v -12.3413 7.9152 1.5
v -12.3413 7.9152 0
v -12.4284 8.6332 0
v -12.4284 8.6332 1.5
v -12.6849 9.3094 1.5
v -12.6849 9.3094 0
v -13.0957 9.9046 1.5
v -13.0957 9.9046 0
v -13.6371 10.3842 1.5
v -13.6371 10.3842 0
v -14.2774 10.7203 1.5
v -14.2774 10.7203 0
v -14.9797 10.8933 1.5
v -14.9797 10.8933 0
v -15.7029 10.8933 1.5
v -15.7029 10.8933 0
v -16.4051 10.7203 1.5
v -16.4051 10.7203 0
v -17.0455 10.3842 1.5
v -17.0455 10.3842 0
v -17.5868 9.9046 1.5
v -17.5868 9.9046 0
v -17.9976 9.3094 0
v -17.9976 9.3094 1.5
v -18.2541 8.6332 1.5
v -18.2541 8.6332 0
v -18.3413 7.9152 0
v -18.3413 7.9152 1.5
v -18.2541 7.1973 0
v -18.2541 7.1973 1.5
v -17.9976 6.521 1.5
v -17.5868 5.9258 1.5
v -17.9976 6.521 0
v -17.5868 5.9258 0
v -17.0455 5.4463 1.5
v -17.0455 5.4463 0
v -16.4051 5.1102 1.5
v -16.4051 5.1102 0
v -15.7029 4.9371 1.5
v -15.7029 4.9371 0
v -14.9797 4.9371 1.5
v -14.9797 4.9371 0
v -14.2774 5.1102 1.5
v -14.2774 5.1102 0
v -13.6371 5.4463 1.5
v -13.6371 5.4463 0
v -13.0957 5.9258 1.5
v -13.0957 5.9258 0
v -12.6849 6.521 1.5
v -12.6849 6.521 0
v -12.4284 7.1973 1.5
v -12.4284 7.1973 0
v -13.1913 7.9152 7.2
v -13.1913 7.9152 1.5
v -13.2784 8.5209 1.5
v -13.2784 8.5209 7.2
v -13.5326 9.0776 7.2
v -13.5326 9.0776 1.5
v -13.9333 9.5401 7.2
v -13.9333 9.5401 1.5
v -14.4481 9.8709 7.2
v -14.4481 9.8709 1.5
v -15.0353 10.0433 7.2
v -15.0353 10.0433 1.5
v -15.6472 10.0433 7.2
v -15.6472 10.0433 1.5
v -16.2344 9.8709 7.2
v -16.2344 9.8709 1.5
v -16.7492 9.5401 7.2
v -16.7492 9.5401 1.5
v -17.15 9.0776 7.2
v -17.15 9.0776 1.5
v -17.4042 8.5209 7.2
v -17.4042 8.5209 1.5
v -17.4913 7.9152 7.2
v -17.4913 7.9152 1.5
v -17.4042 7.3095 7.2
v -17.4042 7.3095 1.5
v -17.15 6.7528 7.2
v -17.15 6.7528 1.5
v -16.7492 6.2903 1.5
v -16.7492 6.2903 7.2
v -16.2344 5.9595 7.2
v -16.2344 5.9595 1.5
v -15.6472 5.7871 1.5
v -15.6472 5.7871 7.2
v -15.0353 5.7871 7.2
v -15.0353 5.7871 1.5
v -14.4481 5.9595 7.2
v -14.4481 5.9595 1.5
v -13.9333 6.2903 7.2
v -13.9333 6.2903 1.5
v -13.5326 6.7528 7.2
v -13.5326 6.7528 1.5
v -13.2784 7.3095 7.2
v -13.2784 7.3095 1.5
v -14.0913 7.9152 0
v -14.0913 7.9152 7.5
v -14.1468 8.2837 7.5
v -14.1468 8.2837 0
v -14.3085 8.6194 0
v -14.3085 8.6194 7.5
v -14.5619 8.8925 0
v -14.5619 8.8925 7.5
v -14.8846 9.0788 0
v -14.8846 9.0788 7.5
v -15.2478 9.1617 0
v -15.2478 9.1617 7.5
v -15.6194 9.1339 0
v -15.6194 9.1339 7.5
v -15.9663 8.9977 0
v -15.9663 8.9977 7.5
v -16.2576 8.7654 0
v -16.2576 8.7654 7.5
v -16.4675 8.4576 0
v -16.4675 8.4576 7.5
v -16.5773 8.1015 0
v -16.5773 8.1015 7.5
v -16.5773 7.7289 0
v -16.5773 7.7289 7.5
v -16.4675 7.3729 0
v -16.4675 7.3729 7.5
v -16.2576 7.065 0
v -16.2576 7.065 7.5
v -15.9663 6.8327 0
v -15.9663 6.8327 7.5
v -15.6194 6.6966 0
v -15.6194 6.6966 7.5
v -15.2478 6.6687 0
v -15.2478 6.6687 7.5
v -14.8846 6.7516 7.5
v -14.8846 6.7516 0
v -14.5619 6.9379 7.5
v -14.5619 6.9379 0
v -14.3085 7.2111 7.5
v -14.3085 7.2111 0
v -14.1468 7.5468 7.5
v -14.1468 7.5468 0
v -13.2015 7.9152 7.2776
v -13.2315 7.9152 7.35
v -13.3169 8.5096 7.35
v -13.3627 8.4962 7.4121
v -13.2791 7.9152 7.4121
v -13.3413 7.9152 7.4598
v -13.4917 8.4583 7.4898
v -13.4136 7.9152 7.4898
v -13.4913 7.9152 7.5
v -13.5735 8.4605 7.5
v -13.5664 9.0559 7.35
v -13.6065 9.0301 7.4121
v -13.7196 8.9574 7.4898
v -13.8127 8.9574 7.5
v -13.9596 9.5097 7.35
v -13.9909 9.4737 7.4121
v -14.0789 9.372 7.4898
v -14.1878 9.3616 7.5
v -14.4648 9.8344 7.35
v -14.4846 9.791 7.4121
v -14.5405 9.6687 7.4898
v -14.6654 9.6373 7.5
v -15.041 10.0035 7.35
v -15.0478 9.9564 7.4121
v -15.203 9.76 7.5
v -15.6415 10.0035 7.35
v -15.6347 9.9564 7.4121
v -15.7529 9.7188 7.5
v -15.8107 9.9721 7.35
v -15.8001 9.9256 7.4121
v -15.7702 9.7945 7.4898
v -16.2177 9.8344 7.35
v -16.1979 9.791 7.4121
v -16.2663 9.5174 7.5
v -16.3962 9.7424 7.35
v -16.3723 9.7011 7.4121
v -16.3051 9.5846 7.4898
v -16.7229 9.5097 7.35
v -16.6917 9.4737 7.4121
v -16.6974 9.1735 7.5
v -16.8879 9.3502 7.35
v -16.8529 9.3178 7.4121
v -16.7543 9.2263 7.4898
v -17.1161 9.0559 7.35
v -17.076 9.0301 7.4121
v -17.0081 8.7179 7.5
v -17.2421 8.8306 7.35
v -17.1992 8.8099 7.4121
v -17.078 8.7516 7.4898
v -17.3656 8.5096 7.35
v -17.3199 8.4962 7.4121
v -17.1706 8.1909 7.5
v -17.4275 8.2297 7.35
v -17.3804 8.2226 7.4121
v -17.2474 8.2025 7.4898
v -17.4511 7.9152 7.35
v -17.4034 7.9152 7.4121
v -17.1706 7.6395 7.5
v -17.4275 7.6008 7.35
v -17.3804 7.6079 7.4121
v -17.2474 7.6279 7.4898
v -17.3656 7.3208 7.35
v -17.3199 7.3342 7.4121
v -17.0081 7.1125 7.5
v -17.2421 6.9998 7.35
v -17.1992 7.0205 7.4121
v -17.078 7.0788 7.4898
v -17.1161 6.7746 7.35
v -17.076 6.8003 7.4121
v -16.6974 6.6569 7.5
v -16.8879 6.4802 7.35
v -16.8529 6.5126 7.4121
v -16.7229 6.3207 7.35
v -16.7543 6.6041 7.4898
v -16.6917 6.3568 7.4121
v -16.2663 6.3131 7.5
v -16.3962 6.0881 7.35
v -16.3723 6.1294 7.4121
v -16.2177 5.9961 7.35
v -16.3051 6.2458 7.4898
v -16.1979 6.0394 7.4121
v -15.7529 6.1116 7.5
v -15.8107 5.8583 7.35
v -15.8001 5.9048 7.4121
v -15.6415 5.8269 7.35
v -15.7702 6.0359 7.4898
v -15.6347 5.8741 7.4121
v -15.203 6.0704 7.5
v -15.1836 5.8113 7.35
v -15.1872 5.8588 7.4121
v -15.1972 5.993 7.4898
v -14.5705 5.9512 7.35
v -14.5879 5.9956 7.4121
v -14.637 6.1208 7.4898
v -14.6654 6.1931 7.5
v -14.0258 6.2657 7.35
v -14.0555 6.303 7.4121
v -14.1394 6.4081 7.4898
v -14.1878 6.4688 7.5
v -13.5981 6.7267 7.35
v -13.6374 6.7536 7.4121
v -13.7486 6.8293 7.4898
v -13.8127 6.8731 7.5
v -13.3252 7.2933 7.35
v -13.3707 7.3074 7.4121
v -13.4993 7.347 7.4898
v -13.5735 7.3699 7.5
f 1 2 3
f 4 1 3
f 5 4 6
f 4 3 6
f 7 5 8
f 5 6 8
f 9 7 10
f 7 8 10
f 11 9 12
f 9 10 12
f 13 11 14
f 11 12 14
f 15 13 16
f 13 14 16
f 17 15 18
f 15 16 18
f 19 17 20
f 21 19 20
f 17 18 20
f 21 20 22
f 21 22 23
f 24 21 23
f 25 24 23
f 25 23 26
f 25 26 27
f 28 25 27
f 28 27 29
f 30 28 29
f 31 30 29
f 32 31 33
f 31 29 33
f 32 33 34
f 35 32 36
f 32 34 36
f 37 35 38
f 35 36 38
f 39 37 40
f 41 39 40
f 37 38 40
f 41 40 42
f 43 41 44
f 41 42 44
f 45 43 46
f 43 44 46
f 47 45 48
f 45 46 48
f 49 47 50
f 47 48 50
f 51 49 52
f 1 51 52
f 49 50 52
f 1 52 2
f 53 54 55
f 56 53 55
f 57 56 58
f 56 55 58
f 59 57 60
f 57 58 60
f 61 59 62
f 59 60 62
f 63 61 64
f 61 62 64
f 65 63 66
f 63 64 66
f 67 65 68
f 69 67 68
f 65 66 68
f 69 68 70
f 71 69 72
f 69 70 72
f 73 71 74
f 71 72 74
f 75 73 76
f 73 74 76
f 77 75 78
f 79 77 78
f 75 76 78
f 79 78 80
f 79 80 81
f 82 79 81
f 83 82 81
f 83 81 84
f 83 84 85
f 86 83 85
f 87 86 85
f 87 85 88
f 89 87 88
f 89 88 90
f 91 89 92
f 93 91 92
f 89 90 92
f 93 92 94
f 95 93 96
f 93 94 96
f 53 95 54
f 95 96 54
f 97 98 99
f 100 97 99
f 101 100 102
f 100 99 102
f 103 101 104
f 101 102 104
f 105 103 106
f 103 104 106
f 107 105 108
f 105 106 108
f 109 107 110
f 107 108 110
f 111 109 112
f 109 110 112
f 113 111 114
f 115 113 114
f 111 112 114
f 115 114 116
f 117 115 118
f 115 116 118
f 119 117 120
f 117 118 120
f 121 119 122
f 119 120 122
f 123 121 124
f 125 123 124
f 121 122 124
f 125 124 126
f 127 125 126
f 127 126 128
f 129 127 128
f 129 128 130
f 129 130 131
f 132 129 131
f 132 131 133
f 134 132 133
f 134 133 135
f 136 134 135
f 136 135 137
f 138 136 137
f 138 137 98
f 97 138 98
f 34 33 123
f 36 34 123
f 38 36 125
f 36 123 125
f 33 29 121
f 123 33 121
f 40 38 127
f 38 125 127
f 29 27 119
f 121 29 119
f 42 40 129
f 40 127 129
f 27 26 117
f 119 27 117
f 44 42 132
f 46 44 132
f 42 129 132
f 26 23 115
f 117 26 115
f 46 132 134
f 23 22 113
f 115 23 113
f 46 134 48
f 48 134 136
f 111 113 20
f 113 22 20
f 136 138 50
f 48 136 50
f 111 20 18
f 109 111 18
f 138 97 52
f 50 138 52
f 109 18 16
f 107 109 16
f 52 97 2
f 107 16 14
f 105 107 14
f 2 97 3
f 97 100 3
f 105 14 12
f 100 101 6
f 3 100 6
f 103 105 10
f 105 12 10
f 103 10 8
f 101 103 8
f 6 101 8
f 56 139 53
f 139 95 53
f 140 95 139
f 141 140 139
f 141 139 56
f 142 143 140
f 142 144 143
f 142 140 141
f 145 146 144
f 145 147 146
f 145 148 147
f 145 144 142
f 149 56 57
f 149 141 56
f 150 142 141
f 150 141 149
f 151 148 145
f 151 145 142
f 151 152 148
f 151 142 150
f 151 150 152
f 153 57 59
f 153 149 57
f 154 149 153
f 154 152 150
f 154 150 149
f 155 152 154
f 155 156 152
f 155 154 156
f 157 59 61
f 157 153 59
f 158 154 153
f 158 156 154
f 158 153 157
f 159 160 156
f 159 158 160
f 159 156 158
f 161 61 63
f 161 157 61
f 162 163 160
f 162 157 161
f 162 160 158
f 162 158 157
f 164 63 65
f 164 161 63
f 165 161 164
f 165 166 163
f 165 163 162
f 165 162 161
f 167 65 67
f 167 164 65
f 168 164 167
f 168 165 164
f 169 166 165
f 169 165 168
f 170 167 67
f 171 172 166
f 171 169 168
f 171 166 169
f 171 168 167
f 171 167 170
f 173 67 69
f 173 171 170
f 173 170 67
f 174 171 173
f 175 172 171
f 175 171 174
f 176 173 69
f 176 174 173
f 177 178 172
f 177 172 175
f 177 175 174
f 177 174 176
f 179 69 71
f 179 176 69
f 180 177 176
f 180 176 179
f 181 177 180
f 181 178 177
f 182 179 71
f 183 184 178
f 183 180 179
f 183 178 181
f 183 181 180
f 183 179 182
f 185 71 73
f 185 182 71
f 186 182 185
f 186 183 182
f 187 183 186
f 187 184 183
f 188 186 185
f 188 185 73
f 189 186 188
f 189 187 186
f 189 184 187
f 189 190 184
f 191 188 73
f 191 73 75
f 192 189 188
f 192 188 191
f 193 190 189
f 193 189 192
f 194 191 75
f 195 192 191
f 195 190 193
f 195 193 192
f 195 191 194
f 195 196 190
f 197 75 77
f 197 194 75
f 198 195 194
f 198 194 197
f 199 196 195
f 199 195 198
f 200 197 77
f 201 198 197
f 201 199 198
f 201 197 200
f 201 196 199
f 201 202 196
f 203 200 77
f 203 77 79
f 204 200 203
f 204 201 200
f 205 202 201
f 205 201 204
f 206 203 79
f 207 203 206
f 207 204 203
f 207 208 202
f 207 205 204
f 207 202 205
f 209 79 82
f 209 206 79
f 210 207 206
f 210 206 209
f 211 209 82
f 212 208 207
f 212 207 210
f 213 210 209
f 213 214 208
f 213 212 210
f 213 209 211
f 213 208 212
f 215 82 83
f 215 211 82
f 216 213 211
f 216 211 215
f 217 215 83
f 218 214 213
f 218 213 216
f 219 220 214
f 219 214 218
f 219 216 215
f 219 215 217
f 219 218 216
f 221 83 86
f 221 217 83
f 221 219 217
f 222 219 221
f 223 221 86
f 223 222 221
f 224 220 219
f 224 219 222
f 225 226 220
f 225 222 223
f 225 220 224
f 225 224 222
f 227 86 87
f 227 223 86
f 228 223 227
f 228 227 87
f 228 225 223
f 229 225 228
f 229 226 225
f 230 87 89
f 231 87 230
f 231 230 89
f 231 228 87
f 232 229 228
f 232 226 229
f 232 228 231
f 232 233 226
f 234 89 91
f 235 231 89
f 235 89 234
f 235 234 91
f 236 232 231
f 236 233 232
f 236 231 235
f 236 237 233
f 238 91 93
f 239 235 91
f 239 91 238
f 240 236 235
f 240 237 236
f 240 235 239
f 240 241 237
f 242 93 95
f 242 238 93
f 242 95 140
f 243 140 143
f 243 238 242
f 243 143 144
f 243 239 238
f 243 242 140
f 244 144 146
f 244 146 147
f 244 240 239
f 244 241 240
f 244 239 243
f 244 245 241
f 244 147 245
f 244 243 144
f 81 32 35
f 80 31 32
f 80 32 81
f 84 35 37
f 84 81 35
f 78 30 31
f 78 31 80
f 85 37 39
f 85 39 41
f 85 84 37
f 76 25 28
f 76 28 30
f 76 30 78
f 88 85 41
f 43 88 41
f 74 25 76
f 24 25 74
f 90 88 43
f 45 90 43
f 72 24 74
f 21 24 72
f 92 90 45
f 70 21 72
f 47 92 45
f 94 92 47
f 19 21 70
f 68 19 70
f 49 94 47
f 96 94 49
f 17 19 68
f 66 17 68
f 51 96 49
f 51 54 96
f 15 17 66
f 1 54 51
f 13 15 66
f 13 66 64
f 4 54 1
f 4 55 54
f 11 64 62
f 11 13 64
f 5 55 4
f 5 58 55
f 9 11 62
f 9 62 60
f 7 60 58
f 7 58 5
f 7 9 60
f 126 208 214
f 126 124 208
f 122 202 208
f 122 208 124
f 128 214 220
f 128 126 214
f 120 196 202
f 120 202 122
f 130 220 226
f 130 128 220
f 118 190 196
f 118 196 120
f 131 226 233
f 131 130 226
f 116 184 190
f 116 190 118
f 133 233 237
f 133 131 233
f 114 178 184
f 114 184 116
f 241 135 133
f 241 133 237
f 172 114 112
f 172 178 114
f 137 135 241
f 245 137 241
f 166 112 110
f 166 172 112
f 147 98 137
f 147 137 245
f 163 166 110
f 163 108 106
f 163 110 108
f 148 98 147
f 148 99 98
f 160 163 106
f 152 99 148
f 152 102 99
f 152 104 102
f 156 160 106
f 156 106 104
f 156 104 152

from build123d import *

# Parameters (mm, degrees)
ESBO_O1_R                                  = 3
RESSALTO_EXTRUS_O1_DEPTH                   = 1.5
ESBO_O2_R                                  = 2.15
RESSALTO_EXTRUS_O2_DEPTH                   = 6
BROCA_DE_ROSQUEAR_PARA_TARRAXA_DE_M3X0_5_D = 2.5
FILETE1_R                                  = 0.3


with BuildPart() as part:
    # Esboço1 → Ressalto-extrusão1 (new body)
    with BuildSketch(Plane.XY):
        with Locations((-15.341260315, 7.915210608)):
            Circle(ESBO_O1_R)
    extrude(amount=RESSALTO_EXTRUS_O1_DEPTH)

    # Esboço2 → Ressalto-extrusão2 (add)
    with BuildSketch(Plane.XY.offset(1.5)):
        with Locations((-15.341260315, 7.915210608)):
            Circle(ESBO_O2_R)
    extrude(amount=RESSALTO_EXTRUS_O2_DEPTH)

    # Broca de rosquear para tarraxa de M3x0.51 (through all)
    with Locations(Plane(origin=(0, 0, 0), x_dir=(-1, 0, 0), z_dir=(0, 0, -1))):
        with Locations((15.341260315, 7.915210608)):
            Hole(BROCA_DE_ROSQUEAR_PARA_TARRAXA_DE_M3X0_5_D / 2)

    # Filete1
    filete1_edges = [part.edges().sort_by_distance(p)[0] for p in [
        (-17.491260315, 7.915210608, 7.5),
    ]]
    fillet(filete1_edges, radius=FILETE1_R)


solid = part.part
